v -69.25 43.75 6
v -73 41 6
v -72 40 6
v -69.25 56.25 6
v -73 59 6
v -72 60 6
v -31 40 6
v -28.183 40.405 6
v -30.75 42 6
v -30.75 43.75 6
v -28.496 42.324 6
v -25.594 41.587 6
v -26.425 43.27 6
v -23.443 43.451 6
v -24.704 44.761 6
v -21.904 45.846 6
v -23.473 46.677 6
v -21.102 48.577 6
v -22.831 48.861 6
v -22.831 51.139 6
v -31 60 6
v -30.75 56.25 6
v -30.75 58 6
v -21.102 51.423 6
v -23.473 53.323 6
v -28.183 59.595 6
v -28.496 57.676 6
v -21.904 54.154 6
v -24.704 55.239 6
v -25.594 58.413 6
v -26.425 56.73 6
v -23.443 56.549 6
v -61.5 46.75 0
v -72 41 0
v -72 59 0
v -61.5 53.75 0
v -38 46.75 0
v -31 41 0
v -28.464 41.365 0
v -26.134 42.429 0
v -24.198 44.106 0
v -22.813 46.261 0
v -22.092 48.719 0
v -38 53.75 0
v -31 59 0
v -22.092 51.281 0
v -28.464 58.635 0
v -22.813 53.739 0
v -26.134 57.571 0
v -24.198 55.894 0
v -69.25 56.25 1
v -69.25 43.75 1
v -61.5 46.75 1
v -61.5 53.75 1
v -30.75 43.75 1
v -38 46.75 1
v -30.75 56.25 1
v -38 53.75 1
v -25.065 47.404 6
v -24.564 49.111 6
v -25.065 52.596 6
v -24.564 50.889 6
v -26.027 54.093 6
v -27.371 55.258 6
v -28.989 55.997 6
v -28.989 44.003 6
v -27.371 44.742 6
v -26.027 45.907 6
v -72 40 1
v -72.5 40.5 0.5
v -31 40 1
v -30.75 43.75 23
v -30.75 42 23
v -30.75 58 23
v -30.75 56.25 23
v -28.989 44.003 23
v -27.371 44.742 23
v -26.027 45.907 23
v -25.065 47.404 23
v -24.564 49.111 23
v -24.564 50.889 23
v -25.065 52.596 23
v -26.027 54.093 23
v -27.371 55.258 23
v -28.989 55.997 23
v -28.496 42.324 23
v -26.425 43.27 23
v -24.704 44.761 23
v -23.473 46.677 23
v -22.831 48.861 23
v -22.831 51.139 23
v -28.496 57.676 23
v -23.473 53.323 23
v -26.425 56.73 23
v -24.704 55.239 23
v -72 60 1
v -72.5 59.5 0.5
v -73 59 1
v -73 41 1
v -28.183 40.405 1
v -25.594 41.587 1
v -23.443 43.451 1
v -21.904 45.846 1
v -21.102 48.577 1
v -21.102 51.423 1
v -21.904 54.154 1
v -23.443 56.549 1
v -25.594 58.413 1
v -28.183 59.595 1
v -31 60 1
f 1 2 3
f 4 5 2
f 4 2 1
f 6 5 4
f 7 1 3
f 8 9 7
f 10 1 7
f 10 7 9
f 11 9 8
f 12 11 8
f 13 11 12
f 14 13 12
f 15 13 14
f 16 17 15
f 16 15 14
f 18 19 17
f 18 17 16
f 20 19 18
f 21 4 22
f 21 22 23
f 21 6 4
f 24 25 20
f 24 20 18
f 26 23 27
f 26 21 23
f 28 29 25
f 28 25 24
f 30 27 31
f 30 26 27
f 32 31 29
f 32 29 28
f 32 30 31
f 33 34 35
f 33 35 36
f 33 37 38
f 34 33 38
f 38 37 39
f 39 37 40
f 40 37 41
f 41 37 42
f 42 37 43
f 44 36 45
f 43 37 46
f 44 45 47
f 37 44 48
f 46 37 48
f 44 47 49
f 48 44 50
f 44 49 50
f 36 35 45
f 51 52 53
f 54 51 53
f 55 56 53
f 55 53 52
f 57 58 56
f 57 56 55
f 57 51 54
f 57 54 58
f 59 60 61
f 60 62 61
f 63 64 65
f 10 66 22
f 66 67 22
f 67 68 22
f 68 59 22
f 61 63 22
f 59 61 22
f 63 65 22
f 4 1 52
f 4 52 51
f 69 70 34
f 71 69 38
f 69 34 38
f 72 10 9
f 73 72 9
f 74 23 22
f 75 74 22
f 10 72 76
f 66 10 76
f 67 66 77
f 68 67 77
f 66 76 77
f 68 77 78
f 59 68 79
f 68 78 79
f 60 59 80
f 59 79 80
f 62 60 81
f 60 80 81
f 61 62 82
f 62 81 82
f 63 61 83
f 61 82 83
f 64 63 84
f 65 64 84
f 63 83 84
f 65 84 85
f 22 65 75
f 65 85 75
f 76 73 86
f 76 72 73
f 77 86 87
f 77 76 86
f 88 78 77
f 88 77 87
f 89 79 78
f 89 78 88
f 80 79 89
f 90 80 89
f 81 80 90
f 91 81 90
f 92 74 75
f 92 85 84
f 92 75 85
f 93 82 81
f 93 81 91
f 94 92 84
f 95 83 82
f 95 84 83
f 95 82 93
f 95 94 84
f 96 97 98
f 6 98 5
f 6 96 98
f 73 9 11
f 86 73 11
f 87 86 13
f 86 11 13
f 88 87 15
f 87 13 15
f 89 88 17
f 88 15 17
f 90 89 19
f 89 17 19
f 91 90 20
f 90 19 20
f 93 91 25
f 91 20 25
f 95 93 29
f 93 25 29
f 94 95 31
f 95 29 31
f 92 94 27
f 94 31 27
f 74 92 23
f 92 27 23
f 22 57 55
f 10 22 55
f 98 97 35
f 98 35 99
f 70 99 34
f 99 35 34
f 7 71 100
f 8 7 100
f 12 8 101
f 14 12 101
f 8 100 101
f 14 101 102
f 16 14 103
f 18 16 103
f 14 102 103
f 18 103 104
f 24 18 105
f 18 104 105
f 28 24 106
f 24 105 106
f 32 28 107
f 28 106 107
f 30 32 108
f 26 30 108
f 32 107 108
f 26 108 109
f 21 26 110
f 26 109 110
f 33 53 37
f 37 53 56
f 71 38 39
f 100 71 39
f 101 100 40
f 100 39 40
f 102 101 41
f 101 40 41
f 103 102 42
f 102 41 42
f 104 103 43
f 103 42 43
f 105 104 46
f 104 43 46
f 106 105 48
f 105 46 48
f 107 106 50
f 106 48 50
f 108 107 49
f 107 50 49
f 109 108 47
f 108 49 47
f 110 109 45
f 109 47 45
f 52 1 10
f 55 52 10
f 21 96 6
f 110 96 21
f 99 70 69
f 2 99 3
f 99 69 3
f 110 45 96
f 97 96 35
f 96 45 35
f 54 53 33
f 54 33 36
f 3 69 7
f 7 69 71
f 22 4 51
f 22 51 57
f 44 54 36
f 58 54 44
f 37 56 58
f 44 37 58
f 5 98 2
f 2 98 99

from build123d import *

# Parameters (mm, degrees)
PAD005_DEPTH    = 6
SKETCH015_W     = 38.5
SKETCH015_H     = 12.5
POCKET003_DEPTH = 5
SKETCH017_W     = 23.5
SKETCH017_H     = 7
POCKET010_DEPTH = 1
PAD006_DEPTH    = 17
POCKET011_DEPTH = 17
CHAMFER002_SIZE = 1
CHAMFER003_SIZE = 1
CHAMFER004_SIZE = 1


with BuildPart() as part:
    # Sketch016 → Pad005 (new body)
    with BuildSketch(Plane.XY):
        with BuildLine():
            Line((-23, 10), (-23, -10))
            Line((-23, -10), (19, -10))
            ThreePointArc((19, -10), (29, 0), (19, 10))
            Line((-23, 10), (19, 10))
        make_face()
    extrude(amount=PAD005_DEPTH)

    # Sketch015 (on Face6 of Pad005) → Pocket003 (cut)
    with BuildSketch(Plane.XY.offset(6)):
        Rectangle(SKETCH015_W, SKETCH015_H)
    extrude(amount=-POCKET003_DEPTH, mode=Mode.SUBTRACT)

    # Sketch017 (on Face11 of Pocket003) → Pocket010 (cut)
    with BuildSketch(Plane.XY.offset(1)):
        with Locations((0.25, 0.25)):
            Rectangle(SKETCH017_W, SKETCH017_H)
    extrude(amount=-POCKET010_DEPTH, mode=Mode.SUBTRACT)

    # Sketch018 (on Face5 of Pocket010) → Pad006 (join)
    with BuildSketch(Plane.XY.offset(6)):
        with BuildLine():
            Line((19.25, 8), (19.25, -8))
            ThreePointArc((19.25, -8), (27.25, 0), (19.25, 8))
        make_face()
    extrude(amount=PAD006_DEPTH)

    # Sketch019 (on Face16 of Pad006) → Pocket011 (cut)
    with BuildSketch(Plane.XY.offset(23)):
        with BuildLine():
            Line((19.25, -6.25), (19.25, 6.25))
            ThreePointArc((19.25, -6.25), (25.5, 0), (19.25, 6.25))
        make_face()
    extrude(amount=-POCKET011_DEPTH, mode=Mode.SUBTRACT)

    # Chamfer002
    chamfer002_edges = [part.edges().sort_by_distance(p)[0] for p in [
        (-2, -10, 0),
    ]]
    chamfer(chamfer002_edges, length=CHAMFER002_SIZE)

    # Chamfer003
    chamfer003_edges = [part.edges().sort_by_distance(p)[0] for p in [
        (-23, 0, 0),
    ]]
    chamfer(chamfer003_edges, length=CHAMFER003_SIZE)

    # Chamfer004
    chamfer004_edges = [part.edges().sort_by_distance(p)[0] for p in [
        (-23, 10, 3.5),
        (-23, -10, 3.5),
    ]]
    chamfer(chamfer004_edges, length=CHAMFER004_SIZE)


with BuildPart() as part_1:
    # Body006 placement: moved
    add(part.part.moved(Location((-50, 50, 0))))


solid = part_1.part
